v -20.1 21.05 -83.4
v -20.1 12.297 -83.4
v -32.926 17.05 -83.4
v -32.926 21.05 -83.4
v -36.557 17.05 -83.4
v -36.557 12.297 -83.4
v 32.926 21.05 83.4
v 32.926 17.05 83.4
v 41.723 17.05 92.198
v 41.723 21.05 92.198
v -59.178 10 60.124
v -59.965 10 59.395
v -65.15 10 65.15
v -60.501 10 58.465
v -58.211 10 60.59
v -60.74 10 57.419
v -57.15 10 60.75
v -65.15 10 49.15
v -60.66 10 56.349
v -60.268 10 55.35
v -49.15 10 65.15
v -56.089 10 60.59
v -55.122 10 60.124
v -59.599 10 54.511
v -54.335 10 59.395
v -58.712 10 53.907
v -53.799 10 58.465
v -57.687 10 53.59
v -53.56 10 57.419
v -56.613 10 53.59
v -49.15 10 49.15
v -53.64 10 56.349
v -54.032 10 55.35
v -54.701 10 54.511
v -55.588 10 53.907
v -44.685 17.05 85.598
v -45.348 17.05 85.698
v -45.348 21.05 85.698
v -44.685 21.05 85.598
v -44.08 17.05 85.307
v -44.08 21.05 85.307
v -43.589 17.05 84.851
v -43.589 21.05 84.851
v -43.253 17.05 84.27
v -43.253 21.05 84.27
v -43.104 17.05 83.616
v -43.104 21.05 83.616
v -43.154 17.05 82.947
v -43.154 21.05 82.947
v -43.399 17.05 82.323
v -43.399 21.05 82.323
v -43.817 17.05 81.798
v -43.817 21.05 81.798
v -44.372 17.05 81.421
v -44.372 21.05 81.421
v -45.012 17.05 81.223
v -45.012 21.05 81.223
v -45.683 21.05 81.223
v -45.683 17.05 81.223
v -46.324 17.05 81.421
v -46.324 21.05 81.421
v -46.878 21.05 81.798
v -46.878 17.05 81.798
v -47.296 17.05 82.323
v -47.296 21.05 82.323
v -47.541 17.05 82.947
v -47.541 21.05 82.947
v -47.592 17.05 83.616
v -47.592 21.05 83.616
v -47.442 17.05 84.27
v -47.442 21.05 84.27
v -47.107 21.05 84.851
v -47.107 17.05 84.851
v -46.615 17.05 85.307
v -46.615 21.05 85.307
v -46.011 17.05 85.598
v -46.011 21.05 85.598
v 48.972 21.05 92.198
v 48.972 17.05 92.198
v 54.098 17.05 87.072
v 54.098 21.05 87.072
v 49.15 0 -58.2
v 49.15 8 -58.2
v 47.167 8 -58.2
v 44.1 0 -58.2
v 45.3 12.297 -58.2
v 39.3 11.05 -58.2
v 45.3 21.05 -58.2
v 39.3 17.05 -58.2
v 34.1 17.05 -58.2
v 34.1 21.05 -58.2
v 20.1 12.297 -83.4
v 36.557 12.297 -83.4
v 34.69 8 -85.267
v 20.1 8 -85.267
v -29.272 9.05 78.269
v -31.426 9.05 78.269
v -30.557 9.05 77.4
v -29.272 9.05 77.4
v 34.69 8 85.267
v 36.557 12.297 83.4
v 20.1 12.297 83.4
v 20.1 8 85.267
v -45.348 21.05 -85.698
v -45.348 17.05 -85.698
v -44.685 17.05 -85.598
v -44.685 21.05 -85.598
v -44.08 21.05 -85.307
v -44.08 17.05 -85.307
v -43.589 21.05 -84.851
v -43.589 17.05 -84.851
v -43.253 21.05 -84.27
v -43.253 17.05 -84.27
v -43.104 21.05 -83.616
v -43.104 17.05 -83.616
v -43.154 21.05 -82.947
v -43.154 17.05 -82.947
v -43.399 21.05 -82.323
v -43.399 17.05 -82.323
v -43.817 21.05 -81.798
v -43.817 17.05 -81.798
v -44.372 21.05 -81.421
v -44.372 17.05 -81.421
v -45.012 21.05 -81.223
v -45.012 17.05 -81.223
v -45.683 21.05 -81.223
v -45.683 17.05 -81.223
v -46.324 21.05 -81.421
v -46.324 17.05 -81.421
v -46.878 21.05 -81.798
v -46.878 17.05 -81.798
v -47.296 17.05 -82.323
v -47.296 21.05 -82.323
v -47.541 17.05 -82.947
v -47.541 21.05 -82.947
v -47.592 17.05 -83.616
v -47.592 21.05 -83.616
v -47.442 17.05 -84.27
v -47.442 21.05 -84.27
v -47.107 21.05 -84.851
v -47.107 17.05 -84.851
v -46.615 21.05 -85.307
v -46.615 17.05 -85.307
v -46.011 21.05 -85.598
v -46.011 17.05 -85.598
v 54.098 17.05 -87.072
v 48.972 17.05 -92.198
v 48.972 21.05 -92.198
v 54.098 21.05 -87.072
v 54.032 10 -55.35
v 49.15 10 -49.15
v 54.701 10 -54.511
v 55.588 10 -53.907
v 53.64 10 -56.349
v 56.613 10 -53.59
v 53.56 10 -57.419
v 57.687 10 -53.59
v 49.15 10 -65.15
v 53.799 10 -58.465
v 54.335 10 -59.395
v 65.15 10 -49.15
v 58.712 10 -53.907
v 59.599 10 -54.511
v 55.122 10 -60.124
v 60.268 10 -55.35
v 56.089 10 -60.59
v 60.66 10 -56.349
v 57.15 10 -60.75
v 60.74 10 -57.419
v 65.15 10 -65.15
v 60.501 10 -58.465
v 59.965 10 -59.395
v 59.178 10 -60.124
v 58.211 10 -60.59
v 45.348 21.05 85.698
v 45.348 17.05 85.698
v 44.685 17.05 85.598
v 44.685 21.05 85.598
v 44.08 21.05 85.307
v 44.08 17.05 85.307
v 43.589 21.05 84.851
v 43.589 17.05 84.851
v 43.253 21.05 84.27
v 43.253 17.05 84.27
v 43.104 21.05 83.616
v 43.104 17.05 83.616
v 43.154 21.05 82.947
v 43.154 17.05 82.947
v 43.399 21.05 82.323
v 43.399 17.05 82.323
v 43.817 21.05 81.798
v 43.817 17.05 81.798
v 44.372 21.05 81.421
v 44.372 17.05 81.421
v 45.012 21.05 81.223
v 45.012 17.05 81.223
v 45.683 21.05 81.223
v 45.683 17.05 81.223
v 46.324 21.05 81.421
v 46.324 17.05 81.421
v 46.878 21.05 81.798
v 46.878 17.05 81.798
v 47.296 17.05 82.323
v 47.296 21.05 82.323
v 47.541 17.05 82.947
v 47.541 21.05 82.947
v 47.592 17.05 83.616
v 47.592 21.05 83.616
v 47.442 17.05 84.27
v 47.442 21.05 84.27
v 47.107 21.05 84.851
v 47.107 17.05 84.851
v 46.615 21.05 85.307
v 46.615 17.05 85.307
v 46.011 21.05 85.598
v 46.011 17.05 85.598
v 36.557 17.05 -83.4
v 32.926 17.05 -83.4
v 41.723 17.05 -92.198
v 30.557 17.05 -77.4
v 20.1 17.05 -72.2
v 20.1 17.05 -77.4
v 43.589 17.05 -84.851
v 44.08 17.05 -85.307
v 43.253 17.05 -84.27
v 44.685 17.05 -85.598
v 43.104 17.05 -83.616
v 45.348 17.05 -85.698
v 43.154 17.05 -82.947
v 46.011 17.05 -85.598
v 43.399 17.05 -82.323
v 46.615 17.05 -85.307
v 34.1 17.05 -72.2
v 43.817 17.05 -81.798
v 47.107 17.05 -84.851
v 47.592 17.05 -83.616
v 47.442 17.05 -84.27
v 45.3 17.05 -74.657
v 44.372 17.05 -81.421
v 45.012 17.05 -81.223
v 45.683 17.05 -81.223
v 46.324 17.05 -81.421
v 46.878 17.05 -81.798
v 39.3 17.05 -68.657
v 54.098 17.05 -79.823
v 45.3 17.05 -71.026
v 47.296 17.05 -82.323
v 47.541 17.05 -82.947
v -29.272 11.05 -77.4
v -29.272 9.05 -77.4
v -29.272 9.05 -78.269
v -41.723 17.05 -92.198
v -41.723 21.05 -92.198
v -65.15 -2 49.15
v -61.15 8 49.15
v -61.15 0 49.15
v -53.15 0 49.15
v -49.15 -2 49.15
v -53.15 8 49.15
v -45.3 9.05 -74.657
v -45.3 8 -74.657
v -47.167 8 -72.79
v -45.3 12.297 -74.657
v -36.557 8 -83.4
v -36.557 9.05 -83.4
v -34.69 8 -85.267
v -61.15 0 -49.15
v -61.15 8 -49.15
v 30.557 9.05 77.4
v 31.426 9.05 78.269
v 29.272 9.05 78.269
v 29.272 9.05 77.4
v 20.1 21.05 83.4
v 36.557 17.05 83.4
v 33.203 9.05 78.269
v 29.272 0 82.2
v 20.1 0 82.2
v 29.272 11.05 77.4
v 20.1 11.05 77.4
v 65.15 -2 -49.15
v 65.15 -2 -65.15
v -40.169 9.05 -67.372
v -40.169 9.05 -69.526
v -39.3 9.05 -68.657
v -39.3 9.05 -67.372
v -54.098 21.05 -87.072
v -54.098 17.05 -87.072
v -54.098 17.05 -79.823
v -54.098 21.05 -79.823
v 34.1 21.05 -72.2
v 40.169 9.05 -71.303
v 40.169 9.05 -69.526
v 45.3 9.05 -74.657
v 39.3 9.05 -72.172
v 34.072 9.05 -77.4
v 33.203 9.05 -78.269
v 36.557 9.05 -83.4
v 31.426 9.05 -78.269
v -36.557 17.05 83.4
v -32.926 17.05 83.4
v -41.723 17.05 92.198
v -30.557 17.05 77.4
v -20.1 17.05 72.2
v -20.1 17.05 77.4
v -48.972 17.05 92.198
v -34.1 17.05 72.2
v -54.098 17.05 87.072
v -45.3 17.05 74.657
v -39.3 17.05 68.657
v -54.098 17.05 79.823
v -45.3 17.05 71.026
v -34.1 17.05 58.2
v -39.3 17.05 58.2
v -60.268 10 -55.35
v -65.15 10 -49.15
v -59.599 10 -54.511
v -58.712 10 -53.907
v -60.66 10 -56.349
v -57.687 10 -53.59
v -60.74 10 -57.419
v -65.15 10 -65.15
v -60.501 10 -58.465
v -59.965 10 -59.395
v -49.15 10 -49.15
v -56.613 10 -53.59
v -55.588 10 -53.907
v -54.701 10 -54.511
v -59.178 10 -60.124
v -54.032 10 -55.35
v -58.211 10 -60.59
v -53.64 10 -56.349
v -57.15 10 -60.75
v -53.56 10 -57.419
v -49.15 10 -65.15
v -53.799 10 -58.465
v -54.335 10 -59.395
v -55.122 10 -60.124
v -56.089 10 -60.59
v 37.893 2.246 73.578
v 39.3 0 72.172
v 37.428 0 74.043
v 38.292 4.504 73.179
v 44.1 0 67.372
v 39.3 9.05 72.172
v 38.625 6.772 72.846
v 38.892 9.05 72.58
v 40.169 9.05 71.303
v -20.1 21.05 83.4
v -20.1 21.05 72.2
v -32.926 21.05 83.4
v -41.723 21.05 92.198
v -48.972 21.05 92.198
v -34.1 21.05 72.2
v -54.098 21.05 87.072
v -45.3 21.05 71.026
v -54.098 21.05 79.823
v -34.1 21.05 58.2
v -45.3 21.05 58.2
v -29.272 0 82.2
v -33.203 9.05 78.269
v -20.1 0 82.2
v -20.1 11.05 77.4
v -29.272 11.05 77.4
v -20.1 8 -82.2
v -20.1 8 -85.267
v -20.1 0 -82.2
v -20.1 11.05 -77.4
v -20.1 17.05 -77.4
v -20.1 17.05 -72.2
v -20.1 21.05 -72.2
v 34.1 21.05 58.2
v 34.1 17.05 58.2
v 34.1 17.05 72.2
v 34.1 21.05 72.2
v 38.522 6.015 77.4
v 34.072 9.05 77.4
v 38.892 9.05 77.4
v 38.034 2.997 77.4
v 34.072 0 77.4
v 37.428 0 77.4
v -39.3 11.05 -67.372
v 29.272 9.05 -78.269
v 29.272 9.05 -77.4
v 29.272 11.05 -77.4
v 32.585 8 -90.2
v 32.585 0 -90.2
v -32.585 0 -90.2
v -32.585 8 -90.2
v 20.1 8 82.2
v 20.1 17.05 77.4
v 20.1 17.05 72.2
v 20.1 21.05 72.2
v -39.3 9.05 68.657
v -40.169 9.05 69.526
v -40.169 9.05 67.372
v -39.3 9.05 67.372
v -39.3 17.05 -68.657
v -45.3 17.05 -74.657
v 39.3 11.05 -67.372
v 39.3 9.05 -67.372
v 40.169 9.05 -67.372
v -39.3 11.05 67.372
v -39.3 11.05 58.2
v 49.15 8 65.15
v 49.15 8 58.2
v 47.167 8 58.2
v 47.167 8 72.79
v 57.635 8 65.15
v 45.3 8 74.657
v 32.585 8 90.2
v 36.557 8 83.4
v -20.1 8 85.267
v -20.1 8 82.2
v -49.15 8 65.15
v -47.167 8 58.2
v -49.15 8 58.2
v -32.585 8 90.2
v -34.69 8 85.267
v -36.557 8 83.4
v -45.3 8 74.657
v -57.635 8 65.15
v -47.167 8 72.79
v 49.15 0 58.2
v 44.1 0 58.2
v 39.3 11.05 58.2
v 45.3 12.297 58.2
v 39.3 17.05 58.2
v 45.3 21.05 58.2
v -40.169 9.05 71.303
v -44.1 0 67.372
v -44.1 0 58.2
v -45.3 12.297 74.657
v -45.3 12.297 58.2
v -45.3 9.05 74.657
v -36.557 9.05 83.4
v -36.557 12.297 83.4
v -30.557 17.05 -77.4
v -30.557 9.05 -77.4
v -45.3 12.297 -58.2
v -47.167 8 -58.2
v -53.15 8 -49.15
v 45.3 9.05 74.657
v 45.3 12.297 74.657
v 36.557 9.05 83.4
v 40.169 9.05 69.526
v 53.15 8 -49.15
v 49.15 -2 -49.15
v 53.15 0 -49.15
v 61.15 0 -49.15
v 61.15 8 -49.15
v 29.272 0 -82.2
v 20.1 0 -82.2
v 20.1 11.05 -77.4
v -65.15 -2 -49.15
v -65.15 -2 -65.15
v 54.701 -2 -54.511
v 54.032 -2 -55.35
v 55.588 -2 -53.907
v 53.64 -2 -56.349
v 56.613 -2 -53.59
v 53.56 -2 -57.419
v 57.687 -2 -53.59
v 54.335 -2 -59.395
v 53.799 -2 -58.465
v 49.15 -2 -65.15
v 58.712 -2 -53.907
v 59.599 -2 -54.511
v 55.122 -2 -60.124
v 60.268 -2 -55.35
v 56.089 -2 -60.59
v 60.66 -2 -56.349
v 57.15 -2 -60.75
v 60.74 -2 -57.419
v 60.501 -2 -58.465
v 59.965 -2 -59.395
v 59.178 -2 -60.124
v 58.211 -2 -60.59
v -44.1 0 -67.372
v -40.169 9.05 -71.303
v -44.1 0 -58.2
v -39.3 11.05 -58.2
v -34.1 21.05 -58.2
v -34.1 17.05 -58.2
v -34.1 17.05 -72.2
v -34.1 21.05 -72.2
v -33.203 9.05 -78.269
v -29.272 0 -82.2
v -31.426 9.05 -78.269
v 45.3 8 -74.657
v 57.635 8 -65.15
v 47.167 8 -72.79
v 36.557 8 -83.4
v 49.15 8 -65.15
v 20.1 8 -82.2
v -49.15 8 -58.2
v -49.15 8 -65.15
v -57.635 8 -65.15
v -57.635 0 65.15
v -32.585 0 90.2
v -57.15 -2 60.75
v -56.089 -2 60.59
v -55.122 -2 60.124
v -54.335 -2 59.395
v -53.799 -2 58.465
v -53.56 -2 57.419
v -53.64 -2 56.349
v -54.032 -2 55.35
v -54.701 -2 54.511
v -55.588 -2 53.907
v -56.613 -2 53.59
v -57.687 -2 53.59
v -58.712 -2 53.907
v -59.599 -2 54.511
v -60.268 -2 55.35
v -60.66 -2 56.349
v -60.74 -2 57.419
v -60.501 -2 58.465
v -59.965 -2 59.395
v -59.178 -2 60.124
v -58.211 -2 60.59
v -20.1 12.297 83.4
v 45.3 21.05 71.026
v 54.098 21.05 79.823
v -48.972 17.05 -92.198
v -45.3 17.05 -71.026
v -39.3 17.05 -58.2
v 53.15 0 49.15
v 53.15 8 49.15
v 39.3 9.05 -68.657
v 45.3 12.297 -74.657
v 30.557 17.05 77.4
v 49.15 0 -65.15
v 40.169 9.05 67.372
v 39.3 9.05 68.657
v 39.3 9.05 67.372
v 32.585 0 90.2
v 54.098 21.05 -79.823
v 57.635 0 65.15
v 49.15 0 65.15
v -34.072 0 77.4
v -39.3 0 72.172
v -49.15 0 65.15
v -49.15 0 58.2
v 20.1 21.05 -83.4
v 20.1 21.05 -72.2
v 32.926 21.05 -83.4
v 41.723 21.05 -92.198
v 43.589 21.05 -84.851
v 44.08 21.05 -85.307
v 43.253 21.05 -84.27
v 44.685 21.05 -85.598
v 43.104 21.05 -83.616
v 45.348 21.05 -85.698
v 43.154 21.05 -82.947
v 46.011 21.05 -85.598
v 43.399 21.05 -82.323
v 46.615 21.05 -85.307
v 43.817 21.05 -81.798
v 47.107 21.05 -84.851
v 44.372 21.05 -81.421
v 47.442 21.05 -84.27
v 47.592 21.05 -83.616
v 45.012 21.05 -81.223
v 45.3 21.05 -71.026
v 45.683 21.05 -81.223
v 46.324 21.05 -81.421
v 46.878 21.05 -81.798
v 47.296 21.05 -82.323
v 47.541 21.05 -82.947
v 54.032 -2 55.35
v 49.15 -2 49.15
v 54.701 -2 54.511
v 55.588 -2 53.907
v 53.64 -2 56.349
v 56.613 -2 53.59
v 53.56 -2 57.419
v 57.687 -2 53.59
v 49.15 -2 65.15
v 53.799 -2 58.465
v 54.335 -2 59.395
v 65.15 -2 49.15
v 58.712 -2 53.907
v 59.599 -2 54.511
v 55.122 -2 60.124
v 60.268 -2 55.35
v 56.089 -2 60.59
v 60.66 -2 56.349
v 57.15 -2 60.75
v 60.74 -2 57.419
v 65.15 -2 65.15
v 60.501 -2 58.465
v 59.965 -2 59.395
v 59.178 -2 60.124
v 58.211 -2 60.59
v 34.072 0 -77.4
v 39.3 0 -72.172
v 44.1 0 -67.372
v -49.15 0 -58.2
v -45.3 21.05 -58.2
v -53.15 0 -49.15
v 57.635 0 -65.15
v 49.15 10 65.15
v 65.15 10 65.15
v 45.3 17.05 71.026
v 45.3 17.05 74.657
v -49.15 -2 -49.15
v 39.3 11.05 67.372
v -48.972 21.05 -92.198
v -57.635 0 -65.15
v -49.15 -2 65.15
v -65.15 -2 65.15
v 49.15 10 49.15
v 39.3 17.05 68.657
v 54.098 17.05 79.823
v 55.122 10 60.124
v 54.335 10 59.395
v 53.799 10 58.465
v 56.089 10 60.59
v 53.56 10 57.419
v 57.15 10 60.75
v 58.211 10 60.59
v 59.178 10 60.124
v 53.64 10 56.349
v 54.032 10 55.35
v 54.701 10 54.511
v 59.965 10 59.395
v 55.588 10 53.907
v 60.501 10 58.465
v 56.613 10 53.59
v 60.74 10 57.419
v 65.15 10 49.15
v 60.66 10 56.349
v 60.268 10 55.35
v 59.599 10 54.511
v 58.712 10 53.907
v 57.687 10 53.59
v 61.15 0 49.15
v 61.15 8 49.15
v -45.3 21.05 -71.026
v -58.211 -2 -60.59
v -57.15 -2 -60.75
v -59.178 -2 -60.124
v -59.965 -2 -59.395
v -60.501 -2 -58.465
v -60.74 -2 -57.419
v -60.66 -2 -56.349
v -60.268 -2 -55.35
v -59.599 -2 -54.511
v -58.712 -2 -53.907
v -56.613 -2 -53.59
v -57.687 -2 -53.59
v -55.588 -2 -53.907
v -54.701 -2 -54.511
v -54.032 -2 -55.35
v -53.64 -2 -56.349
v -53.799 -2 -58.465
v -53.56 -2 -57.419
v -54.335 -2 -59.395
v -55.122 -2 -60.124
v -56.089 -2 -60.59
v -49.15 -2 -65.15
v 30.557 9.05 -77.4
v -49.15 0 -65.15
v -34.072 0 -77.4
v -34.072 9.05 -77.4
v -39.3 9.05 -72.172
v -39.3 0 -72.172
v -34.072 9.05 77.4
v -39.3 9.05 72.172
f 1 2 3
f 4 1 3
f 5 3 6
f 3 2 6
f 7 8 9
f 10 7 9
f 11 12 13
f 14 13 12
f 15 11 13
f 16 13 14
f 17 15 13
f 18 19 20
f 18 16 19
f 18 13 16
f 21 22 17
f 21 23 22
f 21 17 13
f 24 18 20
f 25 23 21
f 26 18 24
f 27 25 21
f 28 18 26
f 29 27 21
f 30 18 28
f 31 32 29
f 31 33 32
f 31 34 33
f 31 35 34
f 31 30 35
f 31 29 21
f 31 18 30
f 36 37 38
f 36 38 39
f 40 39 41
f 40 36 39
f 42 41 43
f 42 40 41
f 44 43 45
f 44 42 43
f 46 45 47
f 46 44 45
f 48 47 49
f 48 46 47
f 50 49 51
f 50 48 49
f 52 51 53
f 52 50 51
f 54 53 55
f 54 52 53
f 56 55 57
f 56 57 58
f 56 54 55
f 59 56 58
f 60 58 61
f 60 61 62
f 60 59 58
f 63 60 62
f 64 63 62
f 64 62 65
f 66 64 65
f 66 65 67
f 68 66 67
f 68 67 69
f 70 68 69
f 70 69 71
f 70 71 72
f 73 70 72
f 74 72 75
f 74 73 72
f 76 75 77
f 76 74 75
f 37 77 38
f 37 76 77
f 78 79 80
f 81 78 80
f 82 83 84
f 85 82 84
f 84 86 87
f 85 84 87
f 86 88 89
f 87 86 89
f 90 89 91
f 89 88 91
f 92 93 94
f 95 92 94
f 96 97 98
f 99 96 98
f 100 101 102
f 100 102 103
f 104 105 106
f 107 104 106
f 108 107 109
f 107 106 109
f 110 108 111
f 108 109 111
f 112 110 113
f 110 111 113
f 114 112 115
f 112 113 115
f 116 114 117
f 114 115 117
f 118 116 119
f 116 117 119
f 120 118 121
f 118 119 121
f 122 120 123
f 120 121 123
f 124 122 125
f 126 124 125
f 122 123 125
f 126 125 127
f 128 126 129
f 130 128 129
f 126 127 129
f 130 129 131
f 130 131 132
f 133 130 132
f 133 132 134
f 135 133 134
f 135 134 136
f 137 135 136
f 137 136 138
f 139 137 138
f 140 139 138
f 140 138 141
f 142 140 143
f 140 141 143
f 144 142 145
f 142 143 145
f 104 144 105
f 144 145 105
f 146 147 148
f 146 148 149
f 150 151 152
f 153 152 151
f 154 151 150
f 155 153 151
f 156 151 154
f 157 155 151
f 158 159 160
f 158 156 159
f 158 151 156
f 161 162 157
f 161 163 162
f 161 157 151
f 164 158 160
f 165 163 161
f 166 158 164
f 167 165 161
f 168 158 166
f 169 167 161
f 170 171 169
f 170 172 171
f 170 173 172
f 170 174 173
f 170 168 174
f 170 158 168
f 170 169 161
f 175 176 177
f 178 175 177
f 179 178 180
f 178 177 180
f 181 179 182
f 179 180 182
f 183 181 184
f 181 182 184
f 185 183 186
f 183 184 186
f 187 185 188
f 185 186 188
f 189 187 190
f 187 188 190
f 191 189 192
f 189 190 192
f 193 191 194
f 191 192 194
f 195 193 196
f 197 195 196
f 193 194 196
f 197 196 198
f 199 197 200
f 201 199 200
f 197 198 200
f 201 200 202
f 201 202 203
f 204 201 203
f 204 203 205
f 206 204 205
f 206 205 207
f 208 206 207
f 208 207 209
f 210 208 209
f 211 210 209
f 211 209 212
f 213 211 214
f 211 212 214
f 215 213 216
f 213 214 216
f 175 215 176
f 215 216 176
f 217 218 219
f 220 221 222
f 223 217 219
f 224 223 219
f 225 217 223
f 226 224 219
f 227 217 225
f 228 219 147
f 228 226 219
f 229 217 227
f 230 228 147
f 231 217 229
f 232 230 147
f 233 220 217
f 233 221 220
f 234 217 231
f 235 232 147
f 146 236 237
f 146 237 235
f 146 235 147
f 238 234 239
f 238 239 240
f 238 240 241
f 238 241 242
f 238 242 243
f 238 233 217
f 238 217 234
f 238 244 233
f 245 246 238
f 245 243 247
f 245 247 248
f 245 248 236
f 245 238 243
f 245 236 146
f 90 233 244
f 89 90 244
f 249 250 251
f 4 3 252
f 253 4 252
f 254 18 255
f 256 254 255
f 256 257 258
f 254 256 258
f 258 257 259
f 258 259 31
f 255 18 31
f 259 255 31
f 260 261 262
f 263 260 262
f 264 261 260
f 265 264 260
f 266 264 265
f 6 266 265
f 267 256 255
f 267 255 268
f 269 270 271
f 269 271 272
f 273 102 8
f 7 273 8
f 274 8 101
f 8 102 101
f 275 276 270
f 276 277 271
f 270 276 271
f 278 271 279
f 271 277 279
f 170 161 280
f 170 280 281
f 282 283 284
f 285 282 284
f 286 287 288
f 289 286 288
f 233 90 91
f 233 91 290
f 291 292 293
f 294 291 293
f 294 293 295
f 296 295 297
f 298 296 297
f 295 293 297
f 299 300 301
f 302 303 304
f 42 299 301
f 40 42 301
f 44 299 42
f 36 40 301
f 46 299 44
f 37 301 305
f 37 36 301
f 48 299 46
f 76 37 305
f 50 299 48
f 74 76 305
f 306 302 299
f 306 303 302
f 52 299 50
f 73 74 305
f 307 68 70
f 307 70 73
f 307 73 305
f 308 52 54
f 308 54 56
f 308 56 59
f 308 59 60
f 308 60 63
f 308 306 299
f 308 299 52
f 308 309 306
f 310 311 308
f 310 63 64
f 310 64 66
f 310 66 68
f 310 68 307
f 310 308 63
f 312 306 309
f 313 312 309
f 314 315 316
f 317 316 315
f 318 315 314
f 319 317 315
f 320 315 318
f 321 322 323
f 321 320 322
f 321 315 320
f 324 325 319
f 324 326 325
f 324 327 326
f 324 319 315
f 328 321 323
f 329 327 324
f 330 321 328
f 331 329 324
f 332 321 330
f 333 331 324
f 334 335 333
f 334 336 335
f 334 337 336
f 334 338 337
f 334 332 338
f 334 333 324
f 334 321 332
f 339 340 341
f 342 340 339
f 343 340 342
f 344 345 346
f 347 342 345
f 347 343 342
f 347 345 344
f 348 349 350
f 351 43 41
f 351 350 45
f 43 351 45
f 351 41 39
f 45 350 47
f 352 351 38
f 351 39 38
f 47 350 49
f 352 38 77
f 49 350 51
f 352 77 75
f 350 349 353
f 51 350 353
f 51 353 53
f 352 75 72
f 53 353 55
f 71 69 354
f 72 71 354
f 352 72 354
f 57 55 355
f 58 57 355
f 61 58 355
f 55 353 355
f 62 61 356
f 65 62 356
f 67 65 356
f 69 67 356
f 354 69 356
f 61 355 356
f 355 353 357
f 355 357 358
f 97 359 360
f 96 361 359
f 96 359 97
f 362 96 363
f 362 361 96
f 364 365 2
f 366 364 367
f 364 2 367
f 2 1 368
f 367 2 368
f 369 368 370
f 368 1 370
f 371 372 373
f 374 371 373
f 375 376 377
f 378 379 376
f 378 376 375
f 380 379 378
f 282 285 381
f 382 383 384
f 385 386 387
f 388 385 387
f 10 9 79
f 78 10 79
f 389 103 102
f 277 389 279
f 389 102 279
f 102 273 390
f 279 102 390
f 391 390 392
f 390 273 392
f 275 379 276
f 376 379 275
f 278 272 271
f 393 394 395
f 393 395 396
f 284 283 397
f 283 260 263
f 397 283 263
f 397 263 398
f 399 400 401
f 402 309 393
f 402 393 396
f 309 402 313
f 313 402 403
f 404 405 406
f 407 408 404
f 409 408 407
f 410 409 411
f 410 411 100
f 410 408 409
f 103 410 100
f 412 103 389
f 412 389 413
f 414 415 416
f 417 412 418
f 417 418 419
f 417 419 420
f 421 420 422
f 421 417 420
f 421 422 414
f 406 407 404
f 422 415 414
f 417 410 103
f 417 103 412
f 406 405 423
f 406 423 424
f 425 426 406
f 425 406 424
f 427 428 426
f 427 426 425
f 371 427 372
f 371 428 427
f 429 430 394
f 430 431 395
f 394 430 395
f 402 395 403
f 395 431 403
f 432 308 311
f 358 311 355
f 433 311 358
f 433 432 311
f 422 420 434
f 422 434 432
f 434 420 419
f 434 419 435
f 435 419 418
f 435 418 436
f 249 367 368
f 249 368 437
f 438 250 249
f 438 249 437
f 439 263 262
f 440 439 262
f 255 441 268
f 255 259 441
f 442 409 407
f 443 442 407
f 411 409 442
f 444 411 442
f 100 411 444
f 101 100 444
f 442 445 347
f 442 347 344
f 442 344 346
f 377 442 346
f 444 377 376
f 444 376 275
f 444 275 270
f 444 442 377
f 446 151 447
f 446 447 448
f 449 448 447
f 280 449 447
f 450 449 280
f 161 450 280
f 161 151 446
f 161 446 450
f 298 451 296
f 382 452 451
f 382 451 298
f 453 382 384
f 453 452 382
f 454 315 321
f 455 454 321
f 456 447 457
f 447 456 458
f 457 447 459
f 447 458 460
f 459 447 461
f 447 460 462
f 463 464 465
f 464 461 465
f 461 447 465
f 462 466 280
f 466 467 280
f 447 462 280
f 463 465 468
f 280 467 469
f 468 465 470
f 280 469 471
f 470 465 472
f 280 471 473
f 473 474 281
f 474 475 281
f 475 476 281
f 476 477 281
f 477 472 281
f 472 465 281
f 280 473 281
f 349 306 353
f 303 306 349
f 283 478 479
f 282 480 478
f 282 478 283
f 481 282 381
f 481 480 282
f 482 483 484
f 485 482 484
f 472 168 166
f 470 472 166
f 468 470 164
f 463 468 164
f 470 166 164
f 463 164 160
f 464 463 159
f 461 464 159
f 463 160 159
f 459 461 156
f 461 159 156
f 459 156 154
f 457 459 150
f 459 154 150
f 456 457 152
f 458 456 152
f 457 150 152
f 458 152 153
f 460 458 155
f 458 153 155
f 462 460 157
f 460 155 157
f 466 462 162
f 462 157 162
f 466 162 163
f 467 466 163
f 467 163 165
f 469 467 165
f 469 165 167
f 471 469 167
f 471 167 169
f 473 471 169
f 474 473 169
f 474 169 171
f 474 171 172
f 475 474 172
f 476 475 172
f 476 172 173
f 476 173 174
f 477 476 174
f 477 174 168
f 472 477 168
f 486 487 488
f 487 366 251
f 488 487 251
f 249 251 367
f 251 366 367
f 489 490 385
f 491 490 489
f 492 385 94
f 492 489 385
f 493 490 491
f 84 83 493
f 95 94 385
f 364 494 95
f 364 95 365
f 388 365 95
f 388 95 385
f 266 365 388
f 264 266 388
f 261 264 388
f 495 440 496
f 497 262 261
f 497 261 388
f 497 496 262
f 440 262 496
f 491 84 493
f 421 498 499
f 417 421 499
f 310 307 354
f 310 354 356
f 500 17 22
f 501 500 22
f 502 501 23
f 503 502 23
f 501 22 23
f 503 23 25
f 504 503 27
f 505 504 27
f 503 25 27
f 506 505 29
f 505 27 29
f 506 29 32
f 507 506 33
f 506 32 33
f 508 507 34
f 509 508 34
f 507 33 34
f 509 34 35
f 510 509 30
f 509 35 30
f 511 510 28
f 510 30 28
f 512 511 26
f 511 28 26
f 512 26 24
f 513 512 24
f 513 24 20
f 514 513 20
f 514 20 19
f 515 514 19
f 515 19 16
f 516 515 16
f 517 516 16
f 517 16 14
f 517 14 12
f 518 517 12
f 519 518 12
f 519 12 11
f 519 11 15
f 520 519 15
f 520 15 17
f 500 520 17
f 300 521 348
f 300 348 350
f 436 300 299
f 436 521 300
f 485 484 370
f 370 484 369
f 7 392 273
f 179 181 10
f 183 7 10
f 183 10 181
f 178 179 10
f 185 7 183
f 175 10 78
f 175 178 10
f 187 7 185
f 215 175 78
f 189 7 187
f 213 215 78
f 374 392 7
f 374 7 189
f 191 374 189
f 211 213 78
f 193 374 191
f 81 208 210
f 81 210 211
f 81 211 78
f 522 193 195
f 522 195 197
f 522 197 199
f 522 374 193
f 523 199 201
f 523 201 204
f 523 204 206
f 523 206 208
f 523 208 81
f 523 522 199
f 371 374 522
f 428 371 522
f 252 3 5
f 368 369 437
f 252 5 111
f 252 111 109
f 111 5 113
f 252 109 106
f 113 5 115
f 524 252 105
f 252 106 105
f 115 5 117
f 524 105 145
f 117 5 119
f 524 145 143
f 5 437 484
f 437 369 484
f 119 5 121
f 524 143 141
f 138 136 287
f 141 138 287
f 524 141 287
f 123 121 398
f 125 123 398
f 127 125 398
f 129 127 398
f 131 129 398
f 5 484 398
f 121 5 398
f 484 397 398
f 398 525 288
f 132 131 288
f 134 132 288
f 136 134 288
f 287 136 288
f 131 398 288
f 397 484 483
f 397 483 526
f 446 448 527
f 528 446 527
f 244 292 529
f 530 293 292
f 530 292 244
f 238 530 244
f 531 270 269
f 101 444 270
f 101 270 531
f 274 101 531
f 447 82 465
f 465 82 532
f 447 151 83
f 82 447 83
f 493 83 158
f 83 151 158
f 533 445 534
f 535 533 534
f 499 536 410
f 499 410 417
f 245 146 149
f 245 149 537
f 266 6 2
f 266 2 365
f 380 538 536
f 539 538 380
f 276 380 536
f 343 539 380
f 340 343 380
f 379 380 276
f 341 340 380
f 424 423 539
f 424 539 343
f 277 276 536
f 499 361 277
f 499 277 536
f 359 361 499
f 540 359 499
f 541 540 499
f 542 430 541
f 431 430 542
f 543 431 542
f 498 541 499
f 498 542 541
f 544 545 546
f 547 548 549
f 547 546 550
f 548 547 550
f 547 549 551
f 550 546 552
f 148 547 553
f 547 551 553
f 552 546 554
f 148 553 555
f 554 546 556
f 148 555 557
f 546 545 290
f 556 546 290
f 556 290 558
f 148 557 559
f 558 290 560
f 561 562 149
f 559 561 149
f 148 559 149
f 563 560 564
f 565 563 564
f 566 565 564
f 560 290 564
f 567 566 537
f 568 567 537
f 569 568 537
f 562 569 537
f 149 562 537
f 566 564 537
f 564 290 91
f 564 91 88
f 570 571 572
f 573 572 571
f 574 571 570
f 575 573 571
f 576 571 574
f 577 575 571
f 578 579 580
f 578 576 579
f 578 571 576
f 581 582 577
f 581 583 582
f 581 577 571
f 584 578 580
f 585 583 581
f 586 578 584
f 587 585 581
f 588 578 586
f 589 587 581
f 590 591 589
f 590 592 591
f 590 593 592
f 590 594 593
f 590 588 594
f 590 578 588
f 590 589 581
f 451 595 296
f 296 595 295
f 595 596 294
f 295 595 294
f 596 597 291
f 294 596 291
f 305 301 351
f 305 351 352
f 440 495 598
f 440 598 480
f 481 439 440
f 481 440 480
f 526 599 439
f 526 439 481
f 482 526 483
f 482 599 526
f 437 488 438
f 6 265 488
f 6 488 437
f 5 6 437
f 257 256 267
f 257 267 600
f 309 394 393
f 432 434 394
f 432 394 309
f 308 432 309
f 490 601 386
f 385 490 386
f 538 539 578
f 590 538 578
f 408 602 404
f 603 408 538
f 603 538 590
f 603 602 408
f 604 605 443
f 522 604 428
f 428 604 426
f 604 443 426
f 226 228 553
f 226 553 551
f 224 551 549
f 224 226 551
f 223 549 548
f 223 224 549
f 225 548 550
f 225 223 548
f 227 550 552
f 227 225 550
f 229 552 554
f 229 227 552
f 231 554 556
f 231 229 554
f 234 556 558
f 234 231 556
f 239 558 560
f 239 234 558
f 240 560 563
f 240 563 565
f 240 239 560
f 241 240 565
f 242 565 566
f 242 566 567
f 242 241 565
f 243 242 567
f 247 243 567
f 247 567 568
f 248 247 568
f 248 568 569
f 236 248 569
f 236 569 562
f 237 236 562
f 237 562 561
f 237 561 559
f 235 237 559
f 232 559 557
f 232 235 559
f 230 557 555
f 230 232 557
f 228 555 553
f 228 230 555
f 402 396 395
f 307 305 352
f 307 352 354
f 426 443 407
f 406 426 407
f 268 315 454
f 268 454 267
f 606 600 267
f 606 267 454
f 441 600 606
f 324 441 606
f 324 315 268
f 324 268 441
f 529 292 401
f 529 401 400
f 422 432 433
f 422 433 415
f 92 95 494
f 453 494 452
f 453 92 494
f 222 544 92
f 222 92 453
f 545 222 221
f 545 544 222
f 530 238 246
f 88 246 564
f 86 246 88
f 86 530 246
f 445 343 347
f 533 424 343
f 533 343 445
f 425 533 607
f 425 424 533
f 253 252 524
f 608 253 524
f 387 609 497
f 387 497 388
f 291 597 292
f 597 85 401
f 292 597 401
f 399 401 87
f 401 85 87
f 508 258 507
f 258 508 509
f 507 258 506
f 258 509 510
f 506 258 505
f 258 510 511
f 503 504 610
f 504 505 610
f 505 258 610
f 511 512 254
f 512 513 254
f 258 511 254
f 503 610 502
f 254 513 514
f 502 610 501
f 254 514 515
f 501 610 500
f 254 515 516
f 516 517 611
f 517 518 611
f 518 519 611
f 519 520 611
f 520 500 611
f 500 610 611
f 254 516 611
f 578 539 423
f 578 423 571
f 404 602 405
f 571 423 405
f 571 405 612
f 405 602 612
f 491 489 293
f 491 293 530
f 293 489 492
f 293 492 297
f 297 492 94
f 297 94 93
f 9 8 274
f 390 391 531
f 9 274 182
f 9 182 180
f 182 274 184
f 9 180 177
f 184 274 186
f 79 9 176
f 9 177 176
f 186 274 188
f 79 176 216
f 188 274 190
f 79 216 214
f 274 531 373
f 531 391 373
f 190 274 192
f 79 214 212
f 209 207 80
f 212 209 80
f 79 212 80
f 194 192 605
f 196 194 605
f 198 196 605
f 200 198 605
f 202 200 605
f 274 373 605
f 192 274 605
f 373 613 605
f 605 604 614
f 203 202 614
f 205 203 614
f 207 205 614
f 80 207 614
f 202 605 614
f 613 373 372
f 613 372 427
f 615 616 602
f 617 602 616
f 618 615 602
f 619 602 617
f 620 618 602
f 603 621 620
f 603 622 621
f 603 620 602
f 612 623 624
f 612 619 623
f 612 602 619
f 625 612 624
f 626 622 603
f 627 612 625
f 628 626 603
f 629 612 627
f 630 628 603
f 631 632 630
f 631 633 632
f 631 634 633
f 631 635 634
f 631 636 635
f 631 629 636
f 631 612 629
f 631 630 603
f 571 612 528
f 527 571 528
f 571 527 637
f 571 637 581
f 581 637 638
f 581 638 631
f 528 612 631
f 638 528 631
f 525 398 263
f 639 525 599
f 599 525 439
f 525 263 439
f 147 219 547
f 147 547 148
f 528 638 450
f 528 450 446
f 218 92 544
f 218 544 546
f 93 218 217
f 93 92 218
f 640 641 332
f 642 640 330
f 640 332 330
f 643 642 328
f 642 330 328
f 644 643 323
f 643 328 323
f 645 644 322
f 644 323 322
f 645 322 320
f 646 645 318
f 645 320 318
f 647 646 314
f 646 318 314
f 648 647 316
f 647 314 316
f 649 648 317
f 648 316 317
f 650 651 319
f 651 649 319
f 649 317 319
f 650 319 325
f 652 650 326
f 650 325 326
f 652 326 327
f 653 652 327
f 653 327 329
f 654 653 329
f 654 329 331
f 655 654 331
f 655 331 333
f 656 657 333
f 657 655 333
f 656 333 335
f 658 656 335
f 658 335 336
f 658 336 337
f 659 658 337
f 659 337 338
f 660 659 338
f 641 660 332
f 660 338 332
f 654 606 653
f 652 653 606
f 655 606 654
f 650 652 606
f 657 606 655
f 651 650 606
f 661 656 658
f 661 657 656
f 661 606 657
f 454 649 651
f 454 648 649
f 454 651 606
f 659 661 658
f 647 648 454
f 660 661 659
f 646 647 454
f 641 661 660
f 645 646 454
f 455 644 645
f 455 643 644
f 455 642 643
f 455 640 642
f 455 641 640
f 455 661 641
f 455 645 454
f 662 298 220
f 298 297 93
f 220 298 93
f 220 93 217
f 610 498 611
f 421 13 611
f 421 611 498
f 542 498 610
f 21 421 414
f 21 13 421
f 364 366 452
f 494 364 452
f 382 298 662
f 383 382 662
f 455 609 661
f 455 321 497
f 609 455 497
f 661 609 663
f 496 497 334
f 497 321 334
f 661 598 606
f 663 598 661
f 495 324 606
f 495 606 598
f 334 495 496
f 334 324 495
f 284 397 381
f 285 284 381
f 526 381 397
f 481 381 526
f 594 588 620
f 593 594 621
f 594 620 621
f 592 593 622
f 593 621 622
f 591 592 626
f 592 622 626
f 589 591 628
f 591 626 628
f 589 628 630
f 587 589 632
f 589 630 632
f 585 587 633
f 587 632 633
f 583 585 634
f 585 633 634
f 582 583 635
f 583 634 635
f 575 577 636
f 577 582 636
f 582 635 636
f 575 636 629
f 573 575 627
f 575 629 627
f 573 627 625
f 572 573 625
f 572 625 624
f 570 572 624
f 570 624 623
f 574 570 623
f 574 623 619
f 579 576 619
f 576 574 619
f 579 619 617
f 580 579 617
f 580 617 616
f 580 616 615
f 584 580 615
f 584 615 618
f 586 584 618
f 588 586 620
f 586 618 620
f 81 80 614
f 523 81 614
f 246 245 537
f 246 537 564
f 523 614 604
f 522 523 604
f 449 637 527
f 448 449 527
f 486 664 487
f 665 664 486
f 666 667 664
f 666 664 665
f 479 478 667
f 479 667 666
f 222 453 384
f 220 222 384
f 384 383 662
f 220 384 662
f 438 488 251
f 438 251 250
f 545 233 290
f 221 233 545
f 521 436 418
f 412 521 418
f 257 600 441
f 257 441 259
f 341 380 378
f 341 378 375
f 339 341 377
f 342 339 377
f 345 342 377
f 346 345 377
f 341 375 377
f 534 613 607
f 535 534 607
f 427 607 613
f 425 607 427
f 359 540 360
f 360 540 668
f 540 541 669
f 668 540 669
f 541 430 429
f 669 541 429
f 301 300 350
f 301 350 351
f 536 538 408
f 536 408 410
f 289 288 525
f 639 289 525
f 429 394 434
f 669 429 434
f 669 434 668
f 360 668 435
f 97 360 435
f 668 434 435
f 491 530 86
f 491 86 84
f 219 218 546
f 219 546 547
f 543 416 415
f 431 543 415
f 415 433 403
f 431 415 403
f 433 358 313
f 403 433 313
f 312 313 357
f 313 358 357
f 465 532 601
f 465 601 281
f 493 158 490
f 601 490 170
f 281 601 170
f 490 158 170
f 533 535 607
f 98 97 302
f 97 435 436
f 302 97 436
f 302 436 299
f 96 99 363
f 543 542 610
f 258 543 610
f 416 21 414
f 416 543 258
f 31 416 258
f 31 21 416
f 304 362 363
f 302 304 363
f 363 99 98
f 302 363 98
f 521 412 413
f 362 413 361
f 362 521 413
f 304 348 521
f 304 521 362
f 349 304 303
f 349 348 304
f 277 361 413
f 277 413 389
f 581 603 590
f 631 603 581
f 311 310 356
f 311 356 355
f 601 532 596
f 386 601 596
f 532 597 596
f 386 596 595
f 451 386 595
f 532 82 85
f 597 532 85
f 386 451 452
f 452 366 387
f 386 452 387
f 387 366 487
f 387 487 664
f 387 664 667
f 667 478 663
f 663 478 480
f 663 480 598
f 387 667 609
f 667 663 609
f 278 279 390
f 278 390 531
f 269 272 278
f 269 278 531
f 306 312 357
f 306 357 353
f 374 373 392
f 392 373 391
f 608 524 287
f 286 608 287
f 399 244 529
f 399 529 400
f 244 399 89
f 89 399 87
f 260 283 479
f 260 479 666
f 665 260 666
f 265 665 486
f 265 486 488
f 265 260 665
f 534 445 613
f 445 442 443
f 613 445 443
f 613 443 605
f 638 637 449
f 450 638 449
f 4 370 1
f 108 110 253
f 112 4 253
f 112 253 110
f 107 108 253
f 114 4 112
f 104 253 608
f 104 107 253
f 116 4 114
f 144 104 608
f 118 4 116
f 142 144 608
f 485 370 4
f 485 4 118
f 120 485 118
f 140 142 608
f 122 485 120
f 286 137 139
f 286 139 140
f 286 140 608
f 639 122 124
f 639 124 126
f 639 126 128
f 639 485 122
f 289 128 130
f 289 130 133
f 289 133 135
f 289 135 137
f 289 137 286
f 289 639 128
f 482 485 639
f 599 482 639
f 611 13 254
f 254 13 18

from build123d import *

# Parameters (mm, degrees)
BOSS_EXTRUDE1_DEPTH            = 8
BOSS_EXTRUDE2_DEPTH            = 2
BOSS_EXTRUDE3_DEPTH            = 9.05
SKETCH4_R                      = 2.25
BOSS_EXTRUDE4_DEPTH            = 4
CUT_EXTRUDE1_REACH             = 89.395
SKETCH5_W                      = 12.364675298
SKETCH5_H                      = 8
CUT_EXTRUDE1_DIRECTION_2_DEPTH = 88.395228364
CUT_EXTRUDE2_DEPTH             = 9.171573
CUT_EXTRUDE3_REACH             = 115.505
SKETCH8_W                      = 3.39411255
SKETCH8_H                      = 9.05
CUT_EXTRUDE3_DIRECTION_2_REACH = 115.505
BOSS_EXTRUDE5_DEPTH            = 16.456854
CUT_EXTRUDE4_DEPTH             = 114.504844196
SKETCH12_R                     = 3.6
CUT_EXTRUDE5_DEPTH             = 114.645358602
BOSS_EXTRUDE6_START            = 2
SKETCH13_W                     = 16
SKETCH13_H                     = 16
SKETCH13_R                     = 3.6
BOSS_EXTRUDE6_DEPTH            = 2
CUT_EXTRUDE6_REACH             = 182.475
CUT_EXTRUDE6_DIRECTION_2_DEPTH = 15


with BuildPart() as part:
    # Sketch1 → Boss-Extrude1 (new body)
    with BuildSketch(Plane(origin=(0, 0, 0), x_dir=(1, 0, 0), z_dir=(0, 1, 0))):
        Polygon((-53.15, 0), (-61.15, 0), (-61.15, -49.15), (-65.15, -49.15), (-65.15, -65.15), (-57.635281374, -65.15), (-32.585281374, -90.2), (0, -90.2), (0, -82.2), (-20.1, -82.2), (-20.1, -77.4), (-34.071572875, -77.4), (-39.3, -72.171572875), (-39.3, -58.2), (-49.15, -58.2), (-49.15, -49.15), (-53.15, -49.15), align=None)
    extrude(amount=BOSS_EXTRUDE1_DEPTH)

    # Sketch2 → Boss-Extrude2 (add)
    with BuildSketch(Plane.XZ):
        Polygon((-49.15, 58.2), (-49.15, 49.15), (-65.15, 49.15), (-65.15, 65.15), (-49.15, 65.15), align=None)
    extrude(amount=BOSS_EXTRUDE2_DEPTH)

    # Sketch3 → Boss-Extrude3 (add)
    with BuildSketch(Plane(origin=(0, 8, 0), x_dir=(1, 0, 0), z_dir=(0, 1, 0))):
        Polygon((-39.3, -58.2), (-45.3, -58.2), (-45.3, -74.656854249), (-36.556854249, -83.4), (-20.1, -83.4), (-20.1, -77.4), (-34.071572875, -77.4), (-39.3, -72.171572875), align=None)
    extrude(amount=BOSS_EXTRUDE3_DEPTH)

    # Sketch4 → Boss-Extrude4 (add)
    with BuildSketch(Plane(origin=(0, 17.05, 0), x_dir=(1, 0, 0), z_dir=(0, 1, 0))):
        Polygon((-45.3, -58.2), (-34.1, -58.2), (-34.1, -72.2), (-20.1, -72.2), (-20.1, -83.4), (-32.925631329, -83.4), (-41.723475836, -92.197844507), (-48.972213178, -92.197844507), (-54.097844507, -87.072213178), (-54.097844507, -79.823475836), (-45.3, -71.025631329), align=None)
        with Locations(Location((-45.347844507, -83.447844507, 0), (0, 0, 270))):
            Circle(SKETCH4_R, mode=Mode.SUBTRACT)
    extrude(amount=BOSS_EXTRUDE4_DEPTH)

    # Sketch5 → Cut-Extrude1 (cut, up to next)
    with BuildSketch(Plane(origin=(-59.978427125, 0, 59.978427125), x_dir=(0.7071067811865475, 0, 0.7071067811865477), z_dir=(-0.7071067811865477, 0, 0.7071067811865475)), mode=Mode.PRIVATE) as cut_extrude1_sk1:
        with Locations((26.940768363, 13.05)):
            Rectangle(SKETCH5_W, SKETCH5_H)
    cut_extrude1_tool1 = extrude(cut_extrude1_sk1.sketch, amount=-CUT_EXTRUDE1_REACH, mode=Mode.PRIVATE) & part.part
    add(cut_extrude1_tool1.solids().sort_by_distance((-40.928427, 13.05, 79.028427))[0], mode=Mode.SUBTRACT)

    # Sketch5 → Cut-Extrude1 direction 2 (cut)
    with BuildSketch(Plane(origin=(-59.978427125, 0, 59.978427125), x_dir=(0.7071067811865475, 0, 0.7071067811865477), z_dir=(-0.7071067811865477, 0, 0.7071067811865475))):
        with Locations((26.940768363, 13.05)):
            Rectangle(SKETCH5_W, SKETCH5_H)
    extrude(amount=CUT_EXTRUDE1_DIRECTION_2_DEPTH, mode=Mode.SUBTRACT)

    # Sketch6 → Cut-Extrude2 (cut)
    with BuildSketch(Plane(origin=(-20.1, 0, 0), x_dir=(0, 0, -1), z_dir=(1, 0, 0))):
        Polygon((-82.2, 0), (-77.4, 11.05), (-77.4, 0), align=None)
    cut_extrude2 = extrude(amount=-CUT_EXTRUDE2_DEPTH, mode=Mode.SUBTRACT)

    # Mirror1: Cut-Extrude2 across plane
    add(cut_extrude2.mirror(Plane(origin=(19.05, 0, 19.05), x_dir=(-0.7071067811865477, 0, 0.7071067811865474), z_dir=(0.7071067811865476, 0, 0.7071067811865476))), mode=Mode.SUBTRACT)

    # Cut-Extrude3: up to this face of the body (flat: up to its plane)
    cut_extrude3_end = Plane(part.part.faces().sort_by_distance((-41.7, 5.525, 62.7857865))[0])
    # Sketch8 → Cut-Extrude3 (cut, up to the picked face)
    with BuildSketch(Plane(origin=(19.05, 0, 19.05), x_dir=(0.7071067811865476, 0, -0.7071067811865476), z_dir=(0.7071067811865476, 0, 0.7071067811865476)), mode=Mode.PRIVATE) as cut_extrude3_sk1:
        with Locations((-77.125248815, 4.525)):
            Rectangle(SKETCH8_W, SKETCH8_H)
    cut_extrude3_tool1 = split(extrude(cut_extrude3_sk1.sketch, amount=-CUT_EXTRUDE3_REACH, mode=Mode.PRIVATE), bisect_by=cut_extrude3_end, keep=Keep.BOTH, mode=Mode.PRIVATE)
    add(cut_extrude3_tool1.solids().sort_by(Axis((-35.485786, 4.525, 73.585786), (-0.7071067811865476, 0, -0.7071067811865476)))[0], mode=Mode.SUBTRACT)

    # Cut-Extrude3 direction 2: up to this face of the body (flat: up to its plane)
    cut_extrude3_direction_2_end = Plane(part.part.faces().sort_by_distance((-24.6857865, 5.525, 79.8))[0])
    # Sketch8 → Cut-Extrude3 direction 2 (cut, up to the picked face)
    with BuildSketch(Plane(origin=(19.05, 0, 19.05), x_dir=(0.7071067811865476, 0, -0.7071067811865476), z_dir=(0.7071067811865476, 0, 0.7071067811865476)), mode=Mode.PRIVATE) as cut_extrude3_direction_2_sk1:
        with Locations((-77.125248815, 4.525)):
            Rectangle(SKETCH8_W, SKETCH8_H)
    cut_extrude3_direction_2_tool1 = split(extrude(cut_extrude3_direction_2_sk1.sketch, amount=CUT_EXTRUDE3_DIRECTION_2_REACH, mode=Mode.PRIVATE), bisect_by=cut_extrude3_direction_2_end, keep=Keep.BOTH, mode=Mode.PRIVATE)
    add(cut_extrude3_direction_2_tool1.solids().sort_by(Axis((-35.485786, 4.525, 73.585786), (0.7071067811865476, 0, 0.7071067811865476)))[0], mode=Mode.SUBTRACT)

    # Sketch10 → Boss-Extrude5 (add)
    with BuildSketch(Plane(origin=(-20.1, 0, 0), x_dir=(0, 0, -1), z_dir=(1, 0, 0))):
        Polygon((-83.4, 12.296887645), (-85.26652133, 8), (-83.4, 8), align=None)
    boss_extrude5 = extrude(amount=-BOSS_EXTRUDE5_DEPTH)

    # Sketch11 → Cut-Extrude4 (cut, through all)
    with BuildSketch(Plane(origin=(19.05, 0, 19.05), x_dir=(0.7071067811865476, 0, -0.7071067811865476), z_dir=(0.7071067811865476, 0, 0.7071067811865476))):
        Polygon((-84.82230509, 12.296887645), (-86.142134979, 8), (-84.82230509, 8), align=None)
    cut_extrude4 = extrude(amount=CUT_EXTRUDE4_DEPTH, mode=Mode.SUBTRACT)

    # Mirror2: Boss-Extrude5, Cut-Extrude4 across plane
    add(boss_extrude5.mirror(Plane(origin=(19.05, 0, 19.05), x_dir=(-0.7071067811865477, 0, 0.7071067811865474), z_dir=(0.7071067811865476, 0, 0.7071067811865476))))
    add(cut_extrude4.mirror(Plane(origin=(19.05, 0, 19.05), x_dir=(-0.7071067811865477, 0, 0.7071067811865474), z_dir=(0.7071067811865476, 0, 0.7071067811865476))), mode=Mode.SUBTRACT)

    # Sketch12 → Cut-Extrude5 (cut, through all)
    with BuildSketch(Plane(origin=(0, 8, 0), x_dir=(1, 0, 0), z_dir=(0, 1, 0))):
        with Locations(Location((-57.15, -57.15, 0), (0, 0, 270))):
            Circle(SKETCH12_R)
    extrude(amount=-CUT_EXTRUDE5_DEPTH, mode=Mode.SUBTRACT)

    # Mirror3: part across plane


with BuildPart() as part_1:
    add(part.part)
    add(part.part.mirror(Plane(origin=(-53.15, 8, 0), x_dir=(1, 0, 0), z_dir=(0, 0, 1))))

    # Mirror4: part across plane


with BuildPart() as part_2:
    add(part_1.part)
    add(part_1.part.mirror(Plane(origin=(0, 8, -90.2), x_dir=(0, 0, 1), z_dir=(-1, 0, 0))))

    # Sketch13 → Boss-Extrude6 (add)
    # profile 1 of 4: a face of its own
    with BuildSketch(Plane(origin=(0, 8, 0), x_dir=(1, 0, 0), z_dir=(0, 1, 0)).offset(BOSS_EXTRUDE6_START)):
        with Locations((-57.15, 57.15)):
            Rectangle(SKETCH13_W, SKETCH13_H)
        with Locations(Location((-57.15, 57.15, 0), (0, 0, 90))):
            Circle(SKETCH13_R, mode=Mode.SUBTRACT)
    # profile 2 of 4: a face of its own
    with BuildSketch(Plane(origin=(0, 8, 0), x_dir=(1, 0, 0), z_dir=(0, 1, 0)).offset(BOSS_EXTRUDE6_START)):
        with Locations((-57.15, -57.15)):
            Rectangle(SKETCH13_W, SKETCH13_H)
        with Locations(Location((-57.15, -57.15, 0), (0, 0, 270))):
            Circle(SKETCH13_R, mode=Mode.SUBTRACT)
    # profile 3 of 4: a face of its own
    with BuildSketch(Plane(origin=(0, 8, 0), x_dir=(1, 0, 0), z_dir=(0, 1, 0)).offset(BOSS_EXTRUDE6_START)):
        with Locations((57.15, -57.15)):
            Rectangle(SKETCH13_W, SKETCH13_H)
        with Locations(Location((57.15, -57.15, 0), (0, 0, 270))):
            Circle(SKETCH13_R, mode=Mode.SUBTRACT)
    # profile 4 of 4: a face of its own
    with BuildSketch(Plane(origin=(0, 8, 0), x_dir=(1, 0, 0), z_dir=(0, 1, 0)).offset(BOSS_EXTRUDE6_START)):
        with Locations((57.15, 57.15)):
            Rectangle(SKETCH13_W, SKETCH13_H)
        with Locations(Location((57.15, 57.15, 0), (0, 0, 90))):
            Circle(SKETCH13_R, mode=Mode.SUBTRACT)
    extrude(amount=-BOSS_EXTRUDE6_DEPTH)

    # Cut-Extrude6: up to this face of the body (flat: up to its plane)
    cut_extrude6_end = Plane(part_2.part.faces().sort_by_distance((25.508916271, 13.892566464, 77.4))[0])
    # Sketch14 → Cut-Extrude6 (cut, up to the picked face)
    with BuildSketch(Plane(origin=(0, 0, 74.785786438), x_dir=(-1, 0, 0), z_dir=(0, 0, -1)), mode=Mode.PRIVATE) as cut_extrude6_sk1:
        with BuildLine():
            Line((-38.891815428, 9.05), (-29.271572875, 9.05))
            Line((-29.271572875, 9.05), (-29.271572875, 0))
            Line((-29.271572875, 0), (-37.428466034, 0))
            ThreePointArc((-37.428466034, 0), (-38.292196947, 4.503647029), (-38.891815428, 9.05))
        make_face()
    cut_extrude6_tool1 = split(extrude(cut_extrude6_sk1.sketch, amount=-CUT_EXTRUDE6_REACH, mode=Mode.PRIVATE), bisect_by=cut_extrude6_end, keep=Keep.BOTH, mode=Mode.PRIVATE)
    add(cut_extrude6_tool1.solids().sort_by(Axis((33.771048, 4.647825, 74.785786), (0, 0, 1)))[0], mode=Mode.SUBTRACT)

    # Sketch14 → Cut-Extrude6 direction 2 (cut)
    with BuildSketch(Plane(origin=(0, 0, 74.785786438), x_dir=(-1, 0, 0), z_dir=(0, 0, -1))):
        with BuildLine():
            Line((-38.891815428, 9.05), (-29.271572875, 9.05))
            Line((-29.271572875, 9.05), (-29.271572875, 0))
            Line((-29.271572875, 0), (-37.428466034, 0))
            ThreePointArc((-37.428466034, 0), (-38.292196947, 4.503647029), (-38.891815428, 9.05))
        make_face()
    extrude(amount=CUT_EXTRUDE6_DIRECTION_2_DEPTH, mode=Mode.SUBTRACT)


solid = part_2.part
